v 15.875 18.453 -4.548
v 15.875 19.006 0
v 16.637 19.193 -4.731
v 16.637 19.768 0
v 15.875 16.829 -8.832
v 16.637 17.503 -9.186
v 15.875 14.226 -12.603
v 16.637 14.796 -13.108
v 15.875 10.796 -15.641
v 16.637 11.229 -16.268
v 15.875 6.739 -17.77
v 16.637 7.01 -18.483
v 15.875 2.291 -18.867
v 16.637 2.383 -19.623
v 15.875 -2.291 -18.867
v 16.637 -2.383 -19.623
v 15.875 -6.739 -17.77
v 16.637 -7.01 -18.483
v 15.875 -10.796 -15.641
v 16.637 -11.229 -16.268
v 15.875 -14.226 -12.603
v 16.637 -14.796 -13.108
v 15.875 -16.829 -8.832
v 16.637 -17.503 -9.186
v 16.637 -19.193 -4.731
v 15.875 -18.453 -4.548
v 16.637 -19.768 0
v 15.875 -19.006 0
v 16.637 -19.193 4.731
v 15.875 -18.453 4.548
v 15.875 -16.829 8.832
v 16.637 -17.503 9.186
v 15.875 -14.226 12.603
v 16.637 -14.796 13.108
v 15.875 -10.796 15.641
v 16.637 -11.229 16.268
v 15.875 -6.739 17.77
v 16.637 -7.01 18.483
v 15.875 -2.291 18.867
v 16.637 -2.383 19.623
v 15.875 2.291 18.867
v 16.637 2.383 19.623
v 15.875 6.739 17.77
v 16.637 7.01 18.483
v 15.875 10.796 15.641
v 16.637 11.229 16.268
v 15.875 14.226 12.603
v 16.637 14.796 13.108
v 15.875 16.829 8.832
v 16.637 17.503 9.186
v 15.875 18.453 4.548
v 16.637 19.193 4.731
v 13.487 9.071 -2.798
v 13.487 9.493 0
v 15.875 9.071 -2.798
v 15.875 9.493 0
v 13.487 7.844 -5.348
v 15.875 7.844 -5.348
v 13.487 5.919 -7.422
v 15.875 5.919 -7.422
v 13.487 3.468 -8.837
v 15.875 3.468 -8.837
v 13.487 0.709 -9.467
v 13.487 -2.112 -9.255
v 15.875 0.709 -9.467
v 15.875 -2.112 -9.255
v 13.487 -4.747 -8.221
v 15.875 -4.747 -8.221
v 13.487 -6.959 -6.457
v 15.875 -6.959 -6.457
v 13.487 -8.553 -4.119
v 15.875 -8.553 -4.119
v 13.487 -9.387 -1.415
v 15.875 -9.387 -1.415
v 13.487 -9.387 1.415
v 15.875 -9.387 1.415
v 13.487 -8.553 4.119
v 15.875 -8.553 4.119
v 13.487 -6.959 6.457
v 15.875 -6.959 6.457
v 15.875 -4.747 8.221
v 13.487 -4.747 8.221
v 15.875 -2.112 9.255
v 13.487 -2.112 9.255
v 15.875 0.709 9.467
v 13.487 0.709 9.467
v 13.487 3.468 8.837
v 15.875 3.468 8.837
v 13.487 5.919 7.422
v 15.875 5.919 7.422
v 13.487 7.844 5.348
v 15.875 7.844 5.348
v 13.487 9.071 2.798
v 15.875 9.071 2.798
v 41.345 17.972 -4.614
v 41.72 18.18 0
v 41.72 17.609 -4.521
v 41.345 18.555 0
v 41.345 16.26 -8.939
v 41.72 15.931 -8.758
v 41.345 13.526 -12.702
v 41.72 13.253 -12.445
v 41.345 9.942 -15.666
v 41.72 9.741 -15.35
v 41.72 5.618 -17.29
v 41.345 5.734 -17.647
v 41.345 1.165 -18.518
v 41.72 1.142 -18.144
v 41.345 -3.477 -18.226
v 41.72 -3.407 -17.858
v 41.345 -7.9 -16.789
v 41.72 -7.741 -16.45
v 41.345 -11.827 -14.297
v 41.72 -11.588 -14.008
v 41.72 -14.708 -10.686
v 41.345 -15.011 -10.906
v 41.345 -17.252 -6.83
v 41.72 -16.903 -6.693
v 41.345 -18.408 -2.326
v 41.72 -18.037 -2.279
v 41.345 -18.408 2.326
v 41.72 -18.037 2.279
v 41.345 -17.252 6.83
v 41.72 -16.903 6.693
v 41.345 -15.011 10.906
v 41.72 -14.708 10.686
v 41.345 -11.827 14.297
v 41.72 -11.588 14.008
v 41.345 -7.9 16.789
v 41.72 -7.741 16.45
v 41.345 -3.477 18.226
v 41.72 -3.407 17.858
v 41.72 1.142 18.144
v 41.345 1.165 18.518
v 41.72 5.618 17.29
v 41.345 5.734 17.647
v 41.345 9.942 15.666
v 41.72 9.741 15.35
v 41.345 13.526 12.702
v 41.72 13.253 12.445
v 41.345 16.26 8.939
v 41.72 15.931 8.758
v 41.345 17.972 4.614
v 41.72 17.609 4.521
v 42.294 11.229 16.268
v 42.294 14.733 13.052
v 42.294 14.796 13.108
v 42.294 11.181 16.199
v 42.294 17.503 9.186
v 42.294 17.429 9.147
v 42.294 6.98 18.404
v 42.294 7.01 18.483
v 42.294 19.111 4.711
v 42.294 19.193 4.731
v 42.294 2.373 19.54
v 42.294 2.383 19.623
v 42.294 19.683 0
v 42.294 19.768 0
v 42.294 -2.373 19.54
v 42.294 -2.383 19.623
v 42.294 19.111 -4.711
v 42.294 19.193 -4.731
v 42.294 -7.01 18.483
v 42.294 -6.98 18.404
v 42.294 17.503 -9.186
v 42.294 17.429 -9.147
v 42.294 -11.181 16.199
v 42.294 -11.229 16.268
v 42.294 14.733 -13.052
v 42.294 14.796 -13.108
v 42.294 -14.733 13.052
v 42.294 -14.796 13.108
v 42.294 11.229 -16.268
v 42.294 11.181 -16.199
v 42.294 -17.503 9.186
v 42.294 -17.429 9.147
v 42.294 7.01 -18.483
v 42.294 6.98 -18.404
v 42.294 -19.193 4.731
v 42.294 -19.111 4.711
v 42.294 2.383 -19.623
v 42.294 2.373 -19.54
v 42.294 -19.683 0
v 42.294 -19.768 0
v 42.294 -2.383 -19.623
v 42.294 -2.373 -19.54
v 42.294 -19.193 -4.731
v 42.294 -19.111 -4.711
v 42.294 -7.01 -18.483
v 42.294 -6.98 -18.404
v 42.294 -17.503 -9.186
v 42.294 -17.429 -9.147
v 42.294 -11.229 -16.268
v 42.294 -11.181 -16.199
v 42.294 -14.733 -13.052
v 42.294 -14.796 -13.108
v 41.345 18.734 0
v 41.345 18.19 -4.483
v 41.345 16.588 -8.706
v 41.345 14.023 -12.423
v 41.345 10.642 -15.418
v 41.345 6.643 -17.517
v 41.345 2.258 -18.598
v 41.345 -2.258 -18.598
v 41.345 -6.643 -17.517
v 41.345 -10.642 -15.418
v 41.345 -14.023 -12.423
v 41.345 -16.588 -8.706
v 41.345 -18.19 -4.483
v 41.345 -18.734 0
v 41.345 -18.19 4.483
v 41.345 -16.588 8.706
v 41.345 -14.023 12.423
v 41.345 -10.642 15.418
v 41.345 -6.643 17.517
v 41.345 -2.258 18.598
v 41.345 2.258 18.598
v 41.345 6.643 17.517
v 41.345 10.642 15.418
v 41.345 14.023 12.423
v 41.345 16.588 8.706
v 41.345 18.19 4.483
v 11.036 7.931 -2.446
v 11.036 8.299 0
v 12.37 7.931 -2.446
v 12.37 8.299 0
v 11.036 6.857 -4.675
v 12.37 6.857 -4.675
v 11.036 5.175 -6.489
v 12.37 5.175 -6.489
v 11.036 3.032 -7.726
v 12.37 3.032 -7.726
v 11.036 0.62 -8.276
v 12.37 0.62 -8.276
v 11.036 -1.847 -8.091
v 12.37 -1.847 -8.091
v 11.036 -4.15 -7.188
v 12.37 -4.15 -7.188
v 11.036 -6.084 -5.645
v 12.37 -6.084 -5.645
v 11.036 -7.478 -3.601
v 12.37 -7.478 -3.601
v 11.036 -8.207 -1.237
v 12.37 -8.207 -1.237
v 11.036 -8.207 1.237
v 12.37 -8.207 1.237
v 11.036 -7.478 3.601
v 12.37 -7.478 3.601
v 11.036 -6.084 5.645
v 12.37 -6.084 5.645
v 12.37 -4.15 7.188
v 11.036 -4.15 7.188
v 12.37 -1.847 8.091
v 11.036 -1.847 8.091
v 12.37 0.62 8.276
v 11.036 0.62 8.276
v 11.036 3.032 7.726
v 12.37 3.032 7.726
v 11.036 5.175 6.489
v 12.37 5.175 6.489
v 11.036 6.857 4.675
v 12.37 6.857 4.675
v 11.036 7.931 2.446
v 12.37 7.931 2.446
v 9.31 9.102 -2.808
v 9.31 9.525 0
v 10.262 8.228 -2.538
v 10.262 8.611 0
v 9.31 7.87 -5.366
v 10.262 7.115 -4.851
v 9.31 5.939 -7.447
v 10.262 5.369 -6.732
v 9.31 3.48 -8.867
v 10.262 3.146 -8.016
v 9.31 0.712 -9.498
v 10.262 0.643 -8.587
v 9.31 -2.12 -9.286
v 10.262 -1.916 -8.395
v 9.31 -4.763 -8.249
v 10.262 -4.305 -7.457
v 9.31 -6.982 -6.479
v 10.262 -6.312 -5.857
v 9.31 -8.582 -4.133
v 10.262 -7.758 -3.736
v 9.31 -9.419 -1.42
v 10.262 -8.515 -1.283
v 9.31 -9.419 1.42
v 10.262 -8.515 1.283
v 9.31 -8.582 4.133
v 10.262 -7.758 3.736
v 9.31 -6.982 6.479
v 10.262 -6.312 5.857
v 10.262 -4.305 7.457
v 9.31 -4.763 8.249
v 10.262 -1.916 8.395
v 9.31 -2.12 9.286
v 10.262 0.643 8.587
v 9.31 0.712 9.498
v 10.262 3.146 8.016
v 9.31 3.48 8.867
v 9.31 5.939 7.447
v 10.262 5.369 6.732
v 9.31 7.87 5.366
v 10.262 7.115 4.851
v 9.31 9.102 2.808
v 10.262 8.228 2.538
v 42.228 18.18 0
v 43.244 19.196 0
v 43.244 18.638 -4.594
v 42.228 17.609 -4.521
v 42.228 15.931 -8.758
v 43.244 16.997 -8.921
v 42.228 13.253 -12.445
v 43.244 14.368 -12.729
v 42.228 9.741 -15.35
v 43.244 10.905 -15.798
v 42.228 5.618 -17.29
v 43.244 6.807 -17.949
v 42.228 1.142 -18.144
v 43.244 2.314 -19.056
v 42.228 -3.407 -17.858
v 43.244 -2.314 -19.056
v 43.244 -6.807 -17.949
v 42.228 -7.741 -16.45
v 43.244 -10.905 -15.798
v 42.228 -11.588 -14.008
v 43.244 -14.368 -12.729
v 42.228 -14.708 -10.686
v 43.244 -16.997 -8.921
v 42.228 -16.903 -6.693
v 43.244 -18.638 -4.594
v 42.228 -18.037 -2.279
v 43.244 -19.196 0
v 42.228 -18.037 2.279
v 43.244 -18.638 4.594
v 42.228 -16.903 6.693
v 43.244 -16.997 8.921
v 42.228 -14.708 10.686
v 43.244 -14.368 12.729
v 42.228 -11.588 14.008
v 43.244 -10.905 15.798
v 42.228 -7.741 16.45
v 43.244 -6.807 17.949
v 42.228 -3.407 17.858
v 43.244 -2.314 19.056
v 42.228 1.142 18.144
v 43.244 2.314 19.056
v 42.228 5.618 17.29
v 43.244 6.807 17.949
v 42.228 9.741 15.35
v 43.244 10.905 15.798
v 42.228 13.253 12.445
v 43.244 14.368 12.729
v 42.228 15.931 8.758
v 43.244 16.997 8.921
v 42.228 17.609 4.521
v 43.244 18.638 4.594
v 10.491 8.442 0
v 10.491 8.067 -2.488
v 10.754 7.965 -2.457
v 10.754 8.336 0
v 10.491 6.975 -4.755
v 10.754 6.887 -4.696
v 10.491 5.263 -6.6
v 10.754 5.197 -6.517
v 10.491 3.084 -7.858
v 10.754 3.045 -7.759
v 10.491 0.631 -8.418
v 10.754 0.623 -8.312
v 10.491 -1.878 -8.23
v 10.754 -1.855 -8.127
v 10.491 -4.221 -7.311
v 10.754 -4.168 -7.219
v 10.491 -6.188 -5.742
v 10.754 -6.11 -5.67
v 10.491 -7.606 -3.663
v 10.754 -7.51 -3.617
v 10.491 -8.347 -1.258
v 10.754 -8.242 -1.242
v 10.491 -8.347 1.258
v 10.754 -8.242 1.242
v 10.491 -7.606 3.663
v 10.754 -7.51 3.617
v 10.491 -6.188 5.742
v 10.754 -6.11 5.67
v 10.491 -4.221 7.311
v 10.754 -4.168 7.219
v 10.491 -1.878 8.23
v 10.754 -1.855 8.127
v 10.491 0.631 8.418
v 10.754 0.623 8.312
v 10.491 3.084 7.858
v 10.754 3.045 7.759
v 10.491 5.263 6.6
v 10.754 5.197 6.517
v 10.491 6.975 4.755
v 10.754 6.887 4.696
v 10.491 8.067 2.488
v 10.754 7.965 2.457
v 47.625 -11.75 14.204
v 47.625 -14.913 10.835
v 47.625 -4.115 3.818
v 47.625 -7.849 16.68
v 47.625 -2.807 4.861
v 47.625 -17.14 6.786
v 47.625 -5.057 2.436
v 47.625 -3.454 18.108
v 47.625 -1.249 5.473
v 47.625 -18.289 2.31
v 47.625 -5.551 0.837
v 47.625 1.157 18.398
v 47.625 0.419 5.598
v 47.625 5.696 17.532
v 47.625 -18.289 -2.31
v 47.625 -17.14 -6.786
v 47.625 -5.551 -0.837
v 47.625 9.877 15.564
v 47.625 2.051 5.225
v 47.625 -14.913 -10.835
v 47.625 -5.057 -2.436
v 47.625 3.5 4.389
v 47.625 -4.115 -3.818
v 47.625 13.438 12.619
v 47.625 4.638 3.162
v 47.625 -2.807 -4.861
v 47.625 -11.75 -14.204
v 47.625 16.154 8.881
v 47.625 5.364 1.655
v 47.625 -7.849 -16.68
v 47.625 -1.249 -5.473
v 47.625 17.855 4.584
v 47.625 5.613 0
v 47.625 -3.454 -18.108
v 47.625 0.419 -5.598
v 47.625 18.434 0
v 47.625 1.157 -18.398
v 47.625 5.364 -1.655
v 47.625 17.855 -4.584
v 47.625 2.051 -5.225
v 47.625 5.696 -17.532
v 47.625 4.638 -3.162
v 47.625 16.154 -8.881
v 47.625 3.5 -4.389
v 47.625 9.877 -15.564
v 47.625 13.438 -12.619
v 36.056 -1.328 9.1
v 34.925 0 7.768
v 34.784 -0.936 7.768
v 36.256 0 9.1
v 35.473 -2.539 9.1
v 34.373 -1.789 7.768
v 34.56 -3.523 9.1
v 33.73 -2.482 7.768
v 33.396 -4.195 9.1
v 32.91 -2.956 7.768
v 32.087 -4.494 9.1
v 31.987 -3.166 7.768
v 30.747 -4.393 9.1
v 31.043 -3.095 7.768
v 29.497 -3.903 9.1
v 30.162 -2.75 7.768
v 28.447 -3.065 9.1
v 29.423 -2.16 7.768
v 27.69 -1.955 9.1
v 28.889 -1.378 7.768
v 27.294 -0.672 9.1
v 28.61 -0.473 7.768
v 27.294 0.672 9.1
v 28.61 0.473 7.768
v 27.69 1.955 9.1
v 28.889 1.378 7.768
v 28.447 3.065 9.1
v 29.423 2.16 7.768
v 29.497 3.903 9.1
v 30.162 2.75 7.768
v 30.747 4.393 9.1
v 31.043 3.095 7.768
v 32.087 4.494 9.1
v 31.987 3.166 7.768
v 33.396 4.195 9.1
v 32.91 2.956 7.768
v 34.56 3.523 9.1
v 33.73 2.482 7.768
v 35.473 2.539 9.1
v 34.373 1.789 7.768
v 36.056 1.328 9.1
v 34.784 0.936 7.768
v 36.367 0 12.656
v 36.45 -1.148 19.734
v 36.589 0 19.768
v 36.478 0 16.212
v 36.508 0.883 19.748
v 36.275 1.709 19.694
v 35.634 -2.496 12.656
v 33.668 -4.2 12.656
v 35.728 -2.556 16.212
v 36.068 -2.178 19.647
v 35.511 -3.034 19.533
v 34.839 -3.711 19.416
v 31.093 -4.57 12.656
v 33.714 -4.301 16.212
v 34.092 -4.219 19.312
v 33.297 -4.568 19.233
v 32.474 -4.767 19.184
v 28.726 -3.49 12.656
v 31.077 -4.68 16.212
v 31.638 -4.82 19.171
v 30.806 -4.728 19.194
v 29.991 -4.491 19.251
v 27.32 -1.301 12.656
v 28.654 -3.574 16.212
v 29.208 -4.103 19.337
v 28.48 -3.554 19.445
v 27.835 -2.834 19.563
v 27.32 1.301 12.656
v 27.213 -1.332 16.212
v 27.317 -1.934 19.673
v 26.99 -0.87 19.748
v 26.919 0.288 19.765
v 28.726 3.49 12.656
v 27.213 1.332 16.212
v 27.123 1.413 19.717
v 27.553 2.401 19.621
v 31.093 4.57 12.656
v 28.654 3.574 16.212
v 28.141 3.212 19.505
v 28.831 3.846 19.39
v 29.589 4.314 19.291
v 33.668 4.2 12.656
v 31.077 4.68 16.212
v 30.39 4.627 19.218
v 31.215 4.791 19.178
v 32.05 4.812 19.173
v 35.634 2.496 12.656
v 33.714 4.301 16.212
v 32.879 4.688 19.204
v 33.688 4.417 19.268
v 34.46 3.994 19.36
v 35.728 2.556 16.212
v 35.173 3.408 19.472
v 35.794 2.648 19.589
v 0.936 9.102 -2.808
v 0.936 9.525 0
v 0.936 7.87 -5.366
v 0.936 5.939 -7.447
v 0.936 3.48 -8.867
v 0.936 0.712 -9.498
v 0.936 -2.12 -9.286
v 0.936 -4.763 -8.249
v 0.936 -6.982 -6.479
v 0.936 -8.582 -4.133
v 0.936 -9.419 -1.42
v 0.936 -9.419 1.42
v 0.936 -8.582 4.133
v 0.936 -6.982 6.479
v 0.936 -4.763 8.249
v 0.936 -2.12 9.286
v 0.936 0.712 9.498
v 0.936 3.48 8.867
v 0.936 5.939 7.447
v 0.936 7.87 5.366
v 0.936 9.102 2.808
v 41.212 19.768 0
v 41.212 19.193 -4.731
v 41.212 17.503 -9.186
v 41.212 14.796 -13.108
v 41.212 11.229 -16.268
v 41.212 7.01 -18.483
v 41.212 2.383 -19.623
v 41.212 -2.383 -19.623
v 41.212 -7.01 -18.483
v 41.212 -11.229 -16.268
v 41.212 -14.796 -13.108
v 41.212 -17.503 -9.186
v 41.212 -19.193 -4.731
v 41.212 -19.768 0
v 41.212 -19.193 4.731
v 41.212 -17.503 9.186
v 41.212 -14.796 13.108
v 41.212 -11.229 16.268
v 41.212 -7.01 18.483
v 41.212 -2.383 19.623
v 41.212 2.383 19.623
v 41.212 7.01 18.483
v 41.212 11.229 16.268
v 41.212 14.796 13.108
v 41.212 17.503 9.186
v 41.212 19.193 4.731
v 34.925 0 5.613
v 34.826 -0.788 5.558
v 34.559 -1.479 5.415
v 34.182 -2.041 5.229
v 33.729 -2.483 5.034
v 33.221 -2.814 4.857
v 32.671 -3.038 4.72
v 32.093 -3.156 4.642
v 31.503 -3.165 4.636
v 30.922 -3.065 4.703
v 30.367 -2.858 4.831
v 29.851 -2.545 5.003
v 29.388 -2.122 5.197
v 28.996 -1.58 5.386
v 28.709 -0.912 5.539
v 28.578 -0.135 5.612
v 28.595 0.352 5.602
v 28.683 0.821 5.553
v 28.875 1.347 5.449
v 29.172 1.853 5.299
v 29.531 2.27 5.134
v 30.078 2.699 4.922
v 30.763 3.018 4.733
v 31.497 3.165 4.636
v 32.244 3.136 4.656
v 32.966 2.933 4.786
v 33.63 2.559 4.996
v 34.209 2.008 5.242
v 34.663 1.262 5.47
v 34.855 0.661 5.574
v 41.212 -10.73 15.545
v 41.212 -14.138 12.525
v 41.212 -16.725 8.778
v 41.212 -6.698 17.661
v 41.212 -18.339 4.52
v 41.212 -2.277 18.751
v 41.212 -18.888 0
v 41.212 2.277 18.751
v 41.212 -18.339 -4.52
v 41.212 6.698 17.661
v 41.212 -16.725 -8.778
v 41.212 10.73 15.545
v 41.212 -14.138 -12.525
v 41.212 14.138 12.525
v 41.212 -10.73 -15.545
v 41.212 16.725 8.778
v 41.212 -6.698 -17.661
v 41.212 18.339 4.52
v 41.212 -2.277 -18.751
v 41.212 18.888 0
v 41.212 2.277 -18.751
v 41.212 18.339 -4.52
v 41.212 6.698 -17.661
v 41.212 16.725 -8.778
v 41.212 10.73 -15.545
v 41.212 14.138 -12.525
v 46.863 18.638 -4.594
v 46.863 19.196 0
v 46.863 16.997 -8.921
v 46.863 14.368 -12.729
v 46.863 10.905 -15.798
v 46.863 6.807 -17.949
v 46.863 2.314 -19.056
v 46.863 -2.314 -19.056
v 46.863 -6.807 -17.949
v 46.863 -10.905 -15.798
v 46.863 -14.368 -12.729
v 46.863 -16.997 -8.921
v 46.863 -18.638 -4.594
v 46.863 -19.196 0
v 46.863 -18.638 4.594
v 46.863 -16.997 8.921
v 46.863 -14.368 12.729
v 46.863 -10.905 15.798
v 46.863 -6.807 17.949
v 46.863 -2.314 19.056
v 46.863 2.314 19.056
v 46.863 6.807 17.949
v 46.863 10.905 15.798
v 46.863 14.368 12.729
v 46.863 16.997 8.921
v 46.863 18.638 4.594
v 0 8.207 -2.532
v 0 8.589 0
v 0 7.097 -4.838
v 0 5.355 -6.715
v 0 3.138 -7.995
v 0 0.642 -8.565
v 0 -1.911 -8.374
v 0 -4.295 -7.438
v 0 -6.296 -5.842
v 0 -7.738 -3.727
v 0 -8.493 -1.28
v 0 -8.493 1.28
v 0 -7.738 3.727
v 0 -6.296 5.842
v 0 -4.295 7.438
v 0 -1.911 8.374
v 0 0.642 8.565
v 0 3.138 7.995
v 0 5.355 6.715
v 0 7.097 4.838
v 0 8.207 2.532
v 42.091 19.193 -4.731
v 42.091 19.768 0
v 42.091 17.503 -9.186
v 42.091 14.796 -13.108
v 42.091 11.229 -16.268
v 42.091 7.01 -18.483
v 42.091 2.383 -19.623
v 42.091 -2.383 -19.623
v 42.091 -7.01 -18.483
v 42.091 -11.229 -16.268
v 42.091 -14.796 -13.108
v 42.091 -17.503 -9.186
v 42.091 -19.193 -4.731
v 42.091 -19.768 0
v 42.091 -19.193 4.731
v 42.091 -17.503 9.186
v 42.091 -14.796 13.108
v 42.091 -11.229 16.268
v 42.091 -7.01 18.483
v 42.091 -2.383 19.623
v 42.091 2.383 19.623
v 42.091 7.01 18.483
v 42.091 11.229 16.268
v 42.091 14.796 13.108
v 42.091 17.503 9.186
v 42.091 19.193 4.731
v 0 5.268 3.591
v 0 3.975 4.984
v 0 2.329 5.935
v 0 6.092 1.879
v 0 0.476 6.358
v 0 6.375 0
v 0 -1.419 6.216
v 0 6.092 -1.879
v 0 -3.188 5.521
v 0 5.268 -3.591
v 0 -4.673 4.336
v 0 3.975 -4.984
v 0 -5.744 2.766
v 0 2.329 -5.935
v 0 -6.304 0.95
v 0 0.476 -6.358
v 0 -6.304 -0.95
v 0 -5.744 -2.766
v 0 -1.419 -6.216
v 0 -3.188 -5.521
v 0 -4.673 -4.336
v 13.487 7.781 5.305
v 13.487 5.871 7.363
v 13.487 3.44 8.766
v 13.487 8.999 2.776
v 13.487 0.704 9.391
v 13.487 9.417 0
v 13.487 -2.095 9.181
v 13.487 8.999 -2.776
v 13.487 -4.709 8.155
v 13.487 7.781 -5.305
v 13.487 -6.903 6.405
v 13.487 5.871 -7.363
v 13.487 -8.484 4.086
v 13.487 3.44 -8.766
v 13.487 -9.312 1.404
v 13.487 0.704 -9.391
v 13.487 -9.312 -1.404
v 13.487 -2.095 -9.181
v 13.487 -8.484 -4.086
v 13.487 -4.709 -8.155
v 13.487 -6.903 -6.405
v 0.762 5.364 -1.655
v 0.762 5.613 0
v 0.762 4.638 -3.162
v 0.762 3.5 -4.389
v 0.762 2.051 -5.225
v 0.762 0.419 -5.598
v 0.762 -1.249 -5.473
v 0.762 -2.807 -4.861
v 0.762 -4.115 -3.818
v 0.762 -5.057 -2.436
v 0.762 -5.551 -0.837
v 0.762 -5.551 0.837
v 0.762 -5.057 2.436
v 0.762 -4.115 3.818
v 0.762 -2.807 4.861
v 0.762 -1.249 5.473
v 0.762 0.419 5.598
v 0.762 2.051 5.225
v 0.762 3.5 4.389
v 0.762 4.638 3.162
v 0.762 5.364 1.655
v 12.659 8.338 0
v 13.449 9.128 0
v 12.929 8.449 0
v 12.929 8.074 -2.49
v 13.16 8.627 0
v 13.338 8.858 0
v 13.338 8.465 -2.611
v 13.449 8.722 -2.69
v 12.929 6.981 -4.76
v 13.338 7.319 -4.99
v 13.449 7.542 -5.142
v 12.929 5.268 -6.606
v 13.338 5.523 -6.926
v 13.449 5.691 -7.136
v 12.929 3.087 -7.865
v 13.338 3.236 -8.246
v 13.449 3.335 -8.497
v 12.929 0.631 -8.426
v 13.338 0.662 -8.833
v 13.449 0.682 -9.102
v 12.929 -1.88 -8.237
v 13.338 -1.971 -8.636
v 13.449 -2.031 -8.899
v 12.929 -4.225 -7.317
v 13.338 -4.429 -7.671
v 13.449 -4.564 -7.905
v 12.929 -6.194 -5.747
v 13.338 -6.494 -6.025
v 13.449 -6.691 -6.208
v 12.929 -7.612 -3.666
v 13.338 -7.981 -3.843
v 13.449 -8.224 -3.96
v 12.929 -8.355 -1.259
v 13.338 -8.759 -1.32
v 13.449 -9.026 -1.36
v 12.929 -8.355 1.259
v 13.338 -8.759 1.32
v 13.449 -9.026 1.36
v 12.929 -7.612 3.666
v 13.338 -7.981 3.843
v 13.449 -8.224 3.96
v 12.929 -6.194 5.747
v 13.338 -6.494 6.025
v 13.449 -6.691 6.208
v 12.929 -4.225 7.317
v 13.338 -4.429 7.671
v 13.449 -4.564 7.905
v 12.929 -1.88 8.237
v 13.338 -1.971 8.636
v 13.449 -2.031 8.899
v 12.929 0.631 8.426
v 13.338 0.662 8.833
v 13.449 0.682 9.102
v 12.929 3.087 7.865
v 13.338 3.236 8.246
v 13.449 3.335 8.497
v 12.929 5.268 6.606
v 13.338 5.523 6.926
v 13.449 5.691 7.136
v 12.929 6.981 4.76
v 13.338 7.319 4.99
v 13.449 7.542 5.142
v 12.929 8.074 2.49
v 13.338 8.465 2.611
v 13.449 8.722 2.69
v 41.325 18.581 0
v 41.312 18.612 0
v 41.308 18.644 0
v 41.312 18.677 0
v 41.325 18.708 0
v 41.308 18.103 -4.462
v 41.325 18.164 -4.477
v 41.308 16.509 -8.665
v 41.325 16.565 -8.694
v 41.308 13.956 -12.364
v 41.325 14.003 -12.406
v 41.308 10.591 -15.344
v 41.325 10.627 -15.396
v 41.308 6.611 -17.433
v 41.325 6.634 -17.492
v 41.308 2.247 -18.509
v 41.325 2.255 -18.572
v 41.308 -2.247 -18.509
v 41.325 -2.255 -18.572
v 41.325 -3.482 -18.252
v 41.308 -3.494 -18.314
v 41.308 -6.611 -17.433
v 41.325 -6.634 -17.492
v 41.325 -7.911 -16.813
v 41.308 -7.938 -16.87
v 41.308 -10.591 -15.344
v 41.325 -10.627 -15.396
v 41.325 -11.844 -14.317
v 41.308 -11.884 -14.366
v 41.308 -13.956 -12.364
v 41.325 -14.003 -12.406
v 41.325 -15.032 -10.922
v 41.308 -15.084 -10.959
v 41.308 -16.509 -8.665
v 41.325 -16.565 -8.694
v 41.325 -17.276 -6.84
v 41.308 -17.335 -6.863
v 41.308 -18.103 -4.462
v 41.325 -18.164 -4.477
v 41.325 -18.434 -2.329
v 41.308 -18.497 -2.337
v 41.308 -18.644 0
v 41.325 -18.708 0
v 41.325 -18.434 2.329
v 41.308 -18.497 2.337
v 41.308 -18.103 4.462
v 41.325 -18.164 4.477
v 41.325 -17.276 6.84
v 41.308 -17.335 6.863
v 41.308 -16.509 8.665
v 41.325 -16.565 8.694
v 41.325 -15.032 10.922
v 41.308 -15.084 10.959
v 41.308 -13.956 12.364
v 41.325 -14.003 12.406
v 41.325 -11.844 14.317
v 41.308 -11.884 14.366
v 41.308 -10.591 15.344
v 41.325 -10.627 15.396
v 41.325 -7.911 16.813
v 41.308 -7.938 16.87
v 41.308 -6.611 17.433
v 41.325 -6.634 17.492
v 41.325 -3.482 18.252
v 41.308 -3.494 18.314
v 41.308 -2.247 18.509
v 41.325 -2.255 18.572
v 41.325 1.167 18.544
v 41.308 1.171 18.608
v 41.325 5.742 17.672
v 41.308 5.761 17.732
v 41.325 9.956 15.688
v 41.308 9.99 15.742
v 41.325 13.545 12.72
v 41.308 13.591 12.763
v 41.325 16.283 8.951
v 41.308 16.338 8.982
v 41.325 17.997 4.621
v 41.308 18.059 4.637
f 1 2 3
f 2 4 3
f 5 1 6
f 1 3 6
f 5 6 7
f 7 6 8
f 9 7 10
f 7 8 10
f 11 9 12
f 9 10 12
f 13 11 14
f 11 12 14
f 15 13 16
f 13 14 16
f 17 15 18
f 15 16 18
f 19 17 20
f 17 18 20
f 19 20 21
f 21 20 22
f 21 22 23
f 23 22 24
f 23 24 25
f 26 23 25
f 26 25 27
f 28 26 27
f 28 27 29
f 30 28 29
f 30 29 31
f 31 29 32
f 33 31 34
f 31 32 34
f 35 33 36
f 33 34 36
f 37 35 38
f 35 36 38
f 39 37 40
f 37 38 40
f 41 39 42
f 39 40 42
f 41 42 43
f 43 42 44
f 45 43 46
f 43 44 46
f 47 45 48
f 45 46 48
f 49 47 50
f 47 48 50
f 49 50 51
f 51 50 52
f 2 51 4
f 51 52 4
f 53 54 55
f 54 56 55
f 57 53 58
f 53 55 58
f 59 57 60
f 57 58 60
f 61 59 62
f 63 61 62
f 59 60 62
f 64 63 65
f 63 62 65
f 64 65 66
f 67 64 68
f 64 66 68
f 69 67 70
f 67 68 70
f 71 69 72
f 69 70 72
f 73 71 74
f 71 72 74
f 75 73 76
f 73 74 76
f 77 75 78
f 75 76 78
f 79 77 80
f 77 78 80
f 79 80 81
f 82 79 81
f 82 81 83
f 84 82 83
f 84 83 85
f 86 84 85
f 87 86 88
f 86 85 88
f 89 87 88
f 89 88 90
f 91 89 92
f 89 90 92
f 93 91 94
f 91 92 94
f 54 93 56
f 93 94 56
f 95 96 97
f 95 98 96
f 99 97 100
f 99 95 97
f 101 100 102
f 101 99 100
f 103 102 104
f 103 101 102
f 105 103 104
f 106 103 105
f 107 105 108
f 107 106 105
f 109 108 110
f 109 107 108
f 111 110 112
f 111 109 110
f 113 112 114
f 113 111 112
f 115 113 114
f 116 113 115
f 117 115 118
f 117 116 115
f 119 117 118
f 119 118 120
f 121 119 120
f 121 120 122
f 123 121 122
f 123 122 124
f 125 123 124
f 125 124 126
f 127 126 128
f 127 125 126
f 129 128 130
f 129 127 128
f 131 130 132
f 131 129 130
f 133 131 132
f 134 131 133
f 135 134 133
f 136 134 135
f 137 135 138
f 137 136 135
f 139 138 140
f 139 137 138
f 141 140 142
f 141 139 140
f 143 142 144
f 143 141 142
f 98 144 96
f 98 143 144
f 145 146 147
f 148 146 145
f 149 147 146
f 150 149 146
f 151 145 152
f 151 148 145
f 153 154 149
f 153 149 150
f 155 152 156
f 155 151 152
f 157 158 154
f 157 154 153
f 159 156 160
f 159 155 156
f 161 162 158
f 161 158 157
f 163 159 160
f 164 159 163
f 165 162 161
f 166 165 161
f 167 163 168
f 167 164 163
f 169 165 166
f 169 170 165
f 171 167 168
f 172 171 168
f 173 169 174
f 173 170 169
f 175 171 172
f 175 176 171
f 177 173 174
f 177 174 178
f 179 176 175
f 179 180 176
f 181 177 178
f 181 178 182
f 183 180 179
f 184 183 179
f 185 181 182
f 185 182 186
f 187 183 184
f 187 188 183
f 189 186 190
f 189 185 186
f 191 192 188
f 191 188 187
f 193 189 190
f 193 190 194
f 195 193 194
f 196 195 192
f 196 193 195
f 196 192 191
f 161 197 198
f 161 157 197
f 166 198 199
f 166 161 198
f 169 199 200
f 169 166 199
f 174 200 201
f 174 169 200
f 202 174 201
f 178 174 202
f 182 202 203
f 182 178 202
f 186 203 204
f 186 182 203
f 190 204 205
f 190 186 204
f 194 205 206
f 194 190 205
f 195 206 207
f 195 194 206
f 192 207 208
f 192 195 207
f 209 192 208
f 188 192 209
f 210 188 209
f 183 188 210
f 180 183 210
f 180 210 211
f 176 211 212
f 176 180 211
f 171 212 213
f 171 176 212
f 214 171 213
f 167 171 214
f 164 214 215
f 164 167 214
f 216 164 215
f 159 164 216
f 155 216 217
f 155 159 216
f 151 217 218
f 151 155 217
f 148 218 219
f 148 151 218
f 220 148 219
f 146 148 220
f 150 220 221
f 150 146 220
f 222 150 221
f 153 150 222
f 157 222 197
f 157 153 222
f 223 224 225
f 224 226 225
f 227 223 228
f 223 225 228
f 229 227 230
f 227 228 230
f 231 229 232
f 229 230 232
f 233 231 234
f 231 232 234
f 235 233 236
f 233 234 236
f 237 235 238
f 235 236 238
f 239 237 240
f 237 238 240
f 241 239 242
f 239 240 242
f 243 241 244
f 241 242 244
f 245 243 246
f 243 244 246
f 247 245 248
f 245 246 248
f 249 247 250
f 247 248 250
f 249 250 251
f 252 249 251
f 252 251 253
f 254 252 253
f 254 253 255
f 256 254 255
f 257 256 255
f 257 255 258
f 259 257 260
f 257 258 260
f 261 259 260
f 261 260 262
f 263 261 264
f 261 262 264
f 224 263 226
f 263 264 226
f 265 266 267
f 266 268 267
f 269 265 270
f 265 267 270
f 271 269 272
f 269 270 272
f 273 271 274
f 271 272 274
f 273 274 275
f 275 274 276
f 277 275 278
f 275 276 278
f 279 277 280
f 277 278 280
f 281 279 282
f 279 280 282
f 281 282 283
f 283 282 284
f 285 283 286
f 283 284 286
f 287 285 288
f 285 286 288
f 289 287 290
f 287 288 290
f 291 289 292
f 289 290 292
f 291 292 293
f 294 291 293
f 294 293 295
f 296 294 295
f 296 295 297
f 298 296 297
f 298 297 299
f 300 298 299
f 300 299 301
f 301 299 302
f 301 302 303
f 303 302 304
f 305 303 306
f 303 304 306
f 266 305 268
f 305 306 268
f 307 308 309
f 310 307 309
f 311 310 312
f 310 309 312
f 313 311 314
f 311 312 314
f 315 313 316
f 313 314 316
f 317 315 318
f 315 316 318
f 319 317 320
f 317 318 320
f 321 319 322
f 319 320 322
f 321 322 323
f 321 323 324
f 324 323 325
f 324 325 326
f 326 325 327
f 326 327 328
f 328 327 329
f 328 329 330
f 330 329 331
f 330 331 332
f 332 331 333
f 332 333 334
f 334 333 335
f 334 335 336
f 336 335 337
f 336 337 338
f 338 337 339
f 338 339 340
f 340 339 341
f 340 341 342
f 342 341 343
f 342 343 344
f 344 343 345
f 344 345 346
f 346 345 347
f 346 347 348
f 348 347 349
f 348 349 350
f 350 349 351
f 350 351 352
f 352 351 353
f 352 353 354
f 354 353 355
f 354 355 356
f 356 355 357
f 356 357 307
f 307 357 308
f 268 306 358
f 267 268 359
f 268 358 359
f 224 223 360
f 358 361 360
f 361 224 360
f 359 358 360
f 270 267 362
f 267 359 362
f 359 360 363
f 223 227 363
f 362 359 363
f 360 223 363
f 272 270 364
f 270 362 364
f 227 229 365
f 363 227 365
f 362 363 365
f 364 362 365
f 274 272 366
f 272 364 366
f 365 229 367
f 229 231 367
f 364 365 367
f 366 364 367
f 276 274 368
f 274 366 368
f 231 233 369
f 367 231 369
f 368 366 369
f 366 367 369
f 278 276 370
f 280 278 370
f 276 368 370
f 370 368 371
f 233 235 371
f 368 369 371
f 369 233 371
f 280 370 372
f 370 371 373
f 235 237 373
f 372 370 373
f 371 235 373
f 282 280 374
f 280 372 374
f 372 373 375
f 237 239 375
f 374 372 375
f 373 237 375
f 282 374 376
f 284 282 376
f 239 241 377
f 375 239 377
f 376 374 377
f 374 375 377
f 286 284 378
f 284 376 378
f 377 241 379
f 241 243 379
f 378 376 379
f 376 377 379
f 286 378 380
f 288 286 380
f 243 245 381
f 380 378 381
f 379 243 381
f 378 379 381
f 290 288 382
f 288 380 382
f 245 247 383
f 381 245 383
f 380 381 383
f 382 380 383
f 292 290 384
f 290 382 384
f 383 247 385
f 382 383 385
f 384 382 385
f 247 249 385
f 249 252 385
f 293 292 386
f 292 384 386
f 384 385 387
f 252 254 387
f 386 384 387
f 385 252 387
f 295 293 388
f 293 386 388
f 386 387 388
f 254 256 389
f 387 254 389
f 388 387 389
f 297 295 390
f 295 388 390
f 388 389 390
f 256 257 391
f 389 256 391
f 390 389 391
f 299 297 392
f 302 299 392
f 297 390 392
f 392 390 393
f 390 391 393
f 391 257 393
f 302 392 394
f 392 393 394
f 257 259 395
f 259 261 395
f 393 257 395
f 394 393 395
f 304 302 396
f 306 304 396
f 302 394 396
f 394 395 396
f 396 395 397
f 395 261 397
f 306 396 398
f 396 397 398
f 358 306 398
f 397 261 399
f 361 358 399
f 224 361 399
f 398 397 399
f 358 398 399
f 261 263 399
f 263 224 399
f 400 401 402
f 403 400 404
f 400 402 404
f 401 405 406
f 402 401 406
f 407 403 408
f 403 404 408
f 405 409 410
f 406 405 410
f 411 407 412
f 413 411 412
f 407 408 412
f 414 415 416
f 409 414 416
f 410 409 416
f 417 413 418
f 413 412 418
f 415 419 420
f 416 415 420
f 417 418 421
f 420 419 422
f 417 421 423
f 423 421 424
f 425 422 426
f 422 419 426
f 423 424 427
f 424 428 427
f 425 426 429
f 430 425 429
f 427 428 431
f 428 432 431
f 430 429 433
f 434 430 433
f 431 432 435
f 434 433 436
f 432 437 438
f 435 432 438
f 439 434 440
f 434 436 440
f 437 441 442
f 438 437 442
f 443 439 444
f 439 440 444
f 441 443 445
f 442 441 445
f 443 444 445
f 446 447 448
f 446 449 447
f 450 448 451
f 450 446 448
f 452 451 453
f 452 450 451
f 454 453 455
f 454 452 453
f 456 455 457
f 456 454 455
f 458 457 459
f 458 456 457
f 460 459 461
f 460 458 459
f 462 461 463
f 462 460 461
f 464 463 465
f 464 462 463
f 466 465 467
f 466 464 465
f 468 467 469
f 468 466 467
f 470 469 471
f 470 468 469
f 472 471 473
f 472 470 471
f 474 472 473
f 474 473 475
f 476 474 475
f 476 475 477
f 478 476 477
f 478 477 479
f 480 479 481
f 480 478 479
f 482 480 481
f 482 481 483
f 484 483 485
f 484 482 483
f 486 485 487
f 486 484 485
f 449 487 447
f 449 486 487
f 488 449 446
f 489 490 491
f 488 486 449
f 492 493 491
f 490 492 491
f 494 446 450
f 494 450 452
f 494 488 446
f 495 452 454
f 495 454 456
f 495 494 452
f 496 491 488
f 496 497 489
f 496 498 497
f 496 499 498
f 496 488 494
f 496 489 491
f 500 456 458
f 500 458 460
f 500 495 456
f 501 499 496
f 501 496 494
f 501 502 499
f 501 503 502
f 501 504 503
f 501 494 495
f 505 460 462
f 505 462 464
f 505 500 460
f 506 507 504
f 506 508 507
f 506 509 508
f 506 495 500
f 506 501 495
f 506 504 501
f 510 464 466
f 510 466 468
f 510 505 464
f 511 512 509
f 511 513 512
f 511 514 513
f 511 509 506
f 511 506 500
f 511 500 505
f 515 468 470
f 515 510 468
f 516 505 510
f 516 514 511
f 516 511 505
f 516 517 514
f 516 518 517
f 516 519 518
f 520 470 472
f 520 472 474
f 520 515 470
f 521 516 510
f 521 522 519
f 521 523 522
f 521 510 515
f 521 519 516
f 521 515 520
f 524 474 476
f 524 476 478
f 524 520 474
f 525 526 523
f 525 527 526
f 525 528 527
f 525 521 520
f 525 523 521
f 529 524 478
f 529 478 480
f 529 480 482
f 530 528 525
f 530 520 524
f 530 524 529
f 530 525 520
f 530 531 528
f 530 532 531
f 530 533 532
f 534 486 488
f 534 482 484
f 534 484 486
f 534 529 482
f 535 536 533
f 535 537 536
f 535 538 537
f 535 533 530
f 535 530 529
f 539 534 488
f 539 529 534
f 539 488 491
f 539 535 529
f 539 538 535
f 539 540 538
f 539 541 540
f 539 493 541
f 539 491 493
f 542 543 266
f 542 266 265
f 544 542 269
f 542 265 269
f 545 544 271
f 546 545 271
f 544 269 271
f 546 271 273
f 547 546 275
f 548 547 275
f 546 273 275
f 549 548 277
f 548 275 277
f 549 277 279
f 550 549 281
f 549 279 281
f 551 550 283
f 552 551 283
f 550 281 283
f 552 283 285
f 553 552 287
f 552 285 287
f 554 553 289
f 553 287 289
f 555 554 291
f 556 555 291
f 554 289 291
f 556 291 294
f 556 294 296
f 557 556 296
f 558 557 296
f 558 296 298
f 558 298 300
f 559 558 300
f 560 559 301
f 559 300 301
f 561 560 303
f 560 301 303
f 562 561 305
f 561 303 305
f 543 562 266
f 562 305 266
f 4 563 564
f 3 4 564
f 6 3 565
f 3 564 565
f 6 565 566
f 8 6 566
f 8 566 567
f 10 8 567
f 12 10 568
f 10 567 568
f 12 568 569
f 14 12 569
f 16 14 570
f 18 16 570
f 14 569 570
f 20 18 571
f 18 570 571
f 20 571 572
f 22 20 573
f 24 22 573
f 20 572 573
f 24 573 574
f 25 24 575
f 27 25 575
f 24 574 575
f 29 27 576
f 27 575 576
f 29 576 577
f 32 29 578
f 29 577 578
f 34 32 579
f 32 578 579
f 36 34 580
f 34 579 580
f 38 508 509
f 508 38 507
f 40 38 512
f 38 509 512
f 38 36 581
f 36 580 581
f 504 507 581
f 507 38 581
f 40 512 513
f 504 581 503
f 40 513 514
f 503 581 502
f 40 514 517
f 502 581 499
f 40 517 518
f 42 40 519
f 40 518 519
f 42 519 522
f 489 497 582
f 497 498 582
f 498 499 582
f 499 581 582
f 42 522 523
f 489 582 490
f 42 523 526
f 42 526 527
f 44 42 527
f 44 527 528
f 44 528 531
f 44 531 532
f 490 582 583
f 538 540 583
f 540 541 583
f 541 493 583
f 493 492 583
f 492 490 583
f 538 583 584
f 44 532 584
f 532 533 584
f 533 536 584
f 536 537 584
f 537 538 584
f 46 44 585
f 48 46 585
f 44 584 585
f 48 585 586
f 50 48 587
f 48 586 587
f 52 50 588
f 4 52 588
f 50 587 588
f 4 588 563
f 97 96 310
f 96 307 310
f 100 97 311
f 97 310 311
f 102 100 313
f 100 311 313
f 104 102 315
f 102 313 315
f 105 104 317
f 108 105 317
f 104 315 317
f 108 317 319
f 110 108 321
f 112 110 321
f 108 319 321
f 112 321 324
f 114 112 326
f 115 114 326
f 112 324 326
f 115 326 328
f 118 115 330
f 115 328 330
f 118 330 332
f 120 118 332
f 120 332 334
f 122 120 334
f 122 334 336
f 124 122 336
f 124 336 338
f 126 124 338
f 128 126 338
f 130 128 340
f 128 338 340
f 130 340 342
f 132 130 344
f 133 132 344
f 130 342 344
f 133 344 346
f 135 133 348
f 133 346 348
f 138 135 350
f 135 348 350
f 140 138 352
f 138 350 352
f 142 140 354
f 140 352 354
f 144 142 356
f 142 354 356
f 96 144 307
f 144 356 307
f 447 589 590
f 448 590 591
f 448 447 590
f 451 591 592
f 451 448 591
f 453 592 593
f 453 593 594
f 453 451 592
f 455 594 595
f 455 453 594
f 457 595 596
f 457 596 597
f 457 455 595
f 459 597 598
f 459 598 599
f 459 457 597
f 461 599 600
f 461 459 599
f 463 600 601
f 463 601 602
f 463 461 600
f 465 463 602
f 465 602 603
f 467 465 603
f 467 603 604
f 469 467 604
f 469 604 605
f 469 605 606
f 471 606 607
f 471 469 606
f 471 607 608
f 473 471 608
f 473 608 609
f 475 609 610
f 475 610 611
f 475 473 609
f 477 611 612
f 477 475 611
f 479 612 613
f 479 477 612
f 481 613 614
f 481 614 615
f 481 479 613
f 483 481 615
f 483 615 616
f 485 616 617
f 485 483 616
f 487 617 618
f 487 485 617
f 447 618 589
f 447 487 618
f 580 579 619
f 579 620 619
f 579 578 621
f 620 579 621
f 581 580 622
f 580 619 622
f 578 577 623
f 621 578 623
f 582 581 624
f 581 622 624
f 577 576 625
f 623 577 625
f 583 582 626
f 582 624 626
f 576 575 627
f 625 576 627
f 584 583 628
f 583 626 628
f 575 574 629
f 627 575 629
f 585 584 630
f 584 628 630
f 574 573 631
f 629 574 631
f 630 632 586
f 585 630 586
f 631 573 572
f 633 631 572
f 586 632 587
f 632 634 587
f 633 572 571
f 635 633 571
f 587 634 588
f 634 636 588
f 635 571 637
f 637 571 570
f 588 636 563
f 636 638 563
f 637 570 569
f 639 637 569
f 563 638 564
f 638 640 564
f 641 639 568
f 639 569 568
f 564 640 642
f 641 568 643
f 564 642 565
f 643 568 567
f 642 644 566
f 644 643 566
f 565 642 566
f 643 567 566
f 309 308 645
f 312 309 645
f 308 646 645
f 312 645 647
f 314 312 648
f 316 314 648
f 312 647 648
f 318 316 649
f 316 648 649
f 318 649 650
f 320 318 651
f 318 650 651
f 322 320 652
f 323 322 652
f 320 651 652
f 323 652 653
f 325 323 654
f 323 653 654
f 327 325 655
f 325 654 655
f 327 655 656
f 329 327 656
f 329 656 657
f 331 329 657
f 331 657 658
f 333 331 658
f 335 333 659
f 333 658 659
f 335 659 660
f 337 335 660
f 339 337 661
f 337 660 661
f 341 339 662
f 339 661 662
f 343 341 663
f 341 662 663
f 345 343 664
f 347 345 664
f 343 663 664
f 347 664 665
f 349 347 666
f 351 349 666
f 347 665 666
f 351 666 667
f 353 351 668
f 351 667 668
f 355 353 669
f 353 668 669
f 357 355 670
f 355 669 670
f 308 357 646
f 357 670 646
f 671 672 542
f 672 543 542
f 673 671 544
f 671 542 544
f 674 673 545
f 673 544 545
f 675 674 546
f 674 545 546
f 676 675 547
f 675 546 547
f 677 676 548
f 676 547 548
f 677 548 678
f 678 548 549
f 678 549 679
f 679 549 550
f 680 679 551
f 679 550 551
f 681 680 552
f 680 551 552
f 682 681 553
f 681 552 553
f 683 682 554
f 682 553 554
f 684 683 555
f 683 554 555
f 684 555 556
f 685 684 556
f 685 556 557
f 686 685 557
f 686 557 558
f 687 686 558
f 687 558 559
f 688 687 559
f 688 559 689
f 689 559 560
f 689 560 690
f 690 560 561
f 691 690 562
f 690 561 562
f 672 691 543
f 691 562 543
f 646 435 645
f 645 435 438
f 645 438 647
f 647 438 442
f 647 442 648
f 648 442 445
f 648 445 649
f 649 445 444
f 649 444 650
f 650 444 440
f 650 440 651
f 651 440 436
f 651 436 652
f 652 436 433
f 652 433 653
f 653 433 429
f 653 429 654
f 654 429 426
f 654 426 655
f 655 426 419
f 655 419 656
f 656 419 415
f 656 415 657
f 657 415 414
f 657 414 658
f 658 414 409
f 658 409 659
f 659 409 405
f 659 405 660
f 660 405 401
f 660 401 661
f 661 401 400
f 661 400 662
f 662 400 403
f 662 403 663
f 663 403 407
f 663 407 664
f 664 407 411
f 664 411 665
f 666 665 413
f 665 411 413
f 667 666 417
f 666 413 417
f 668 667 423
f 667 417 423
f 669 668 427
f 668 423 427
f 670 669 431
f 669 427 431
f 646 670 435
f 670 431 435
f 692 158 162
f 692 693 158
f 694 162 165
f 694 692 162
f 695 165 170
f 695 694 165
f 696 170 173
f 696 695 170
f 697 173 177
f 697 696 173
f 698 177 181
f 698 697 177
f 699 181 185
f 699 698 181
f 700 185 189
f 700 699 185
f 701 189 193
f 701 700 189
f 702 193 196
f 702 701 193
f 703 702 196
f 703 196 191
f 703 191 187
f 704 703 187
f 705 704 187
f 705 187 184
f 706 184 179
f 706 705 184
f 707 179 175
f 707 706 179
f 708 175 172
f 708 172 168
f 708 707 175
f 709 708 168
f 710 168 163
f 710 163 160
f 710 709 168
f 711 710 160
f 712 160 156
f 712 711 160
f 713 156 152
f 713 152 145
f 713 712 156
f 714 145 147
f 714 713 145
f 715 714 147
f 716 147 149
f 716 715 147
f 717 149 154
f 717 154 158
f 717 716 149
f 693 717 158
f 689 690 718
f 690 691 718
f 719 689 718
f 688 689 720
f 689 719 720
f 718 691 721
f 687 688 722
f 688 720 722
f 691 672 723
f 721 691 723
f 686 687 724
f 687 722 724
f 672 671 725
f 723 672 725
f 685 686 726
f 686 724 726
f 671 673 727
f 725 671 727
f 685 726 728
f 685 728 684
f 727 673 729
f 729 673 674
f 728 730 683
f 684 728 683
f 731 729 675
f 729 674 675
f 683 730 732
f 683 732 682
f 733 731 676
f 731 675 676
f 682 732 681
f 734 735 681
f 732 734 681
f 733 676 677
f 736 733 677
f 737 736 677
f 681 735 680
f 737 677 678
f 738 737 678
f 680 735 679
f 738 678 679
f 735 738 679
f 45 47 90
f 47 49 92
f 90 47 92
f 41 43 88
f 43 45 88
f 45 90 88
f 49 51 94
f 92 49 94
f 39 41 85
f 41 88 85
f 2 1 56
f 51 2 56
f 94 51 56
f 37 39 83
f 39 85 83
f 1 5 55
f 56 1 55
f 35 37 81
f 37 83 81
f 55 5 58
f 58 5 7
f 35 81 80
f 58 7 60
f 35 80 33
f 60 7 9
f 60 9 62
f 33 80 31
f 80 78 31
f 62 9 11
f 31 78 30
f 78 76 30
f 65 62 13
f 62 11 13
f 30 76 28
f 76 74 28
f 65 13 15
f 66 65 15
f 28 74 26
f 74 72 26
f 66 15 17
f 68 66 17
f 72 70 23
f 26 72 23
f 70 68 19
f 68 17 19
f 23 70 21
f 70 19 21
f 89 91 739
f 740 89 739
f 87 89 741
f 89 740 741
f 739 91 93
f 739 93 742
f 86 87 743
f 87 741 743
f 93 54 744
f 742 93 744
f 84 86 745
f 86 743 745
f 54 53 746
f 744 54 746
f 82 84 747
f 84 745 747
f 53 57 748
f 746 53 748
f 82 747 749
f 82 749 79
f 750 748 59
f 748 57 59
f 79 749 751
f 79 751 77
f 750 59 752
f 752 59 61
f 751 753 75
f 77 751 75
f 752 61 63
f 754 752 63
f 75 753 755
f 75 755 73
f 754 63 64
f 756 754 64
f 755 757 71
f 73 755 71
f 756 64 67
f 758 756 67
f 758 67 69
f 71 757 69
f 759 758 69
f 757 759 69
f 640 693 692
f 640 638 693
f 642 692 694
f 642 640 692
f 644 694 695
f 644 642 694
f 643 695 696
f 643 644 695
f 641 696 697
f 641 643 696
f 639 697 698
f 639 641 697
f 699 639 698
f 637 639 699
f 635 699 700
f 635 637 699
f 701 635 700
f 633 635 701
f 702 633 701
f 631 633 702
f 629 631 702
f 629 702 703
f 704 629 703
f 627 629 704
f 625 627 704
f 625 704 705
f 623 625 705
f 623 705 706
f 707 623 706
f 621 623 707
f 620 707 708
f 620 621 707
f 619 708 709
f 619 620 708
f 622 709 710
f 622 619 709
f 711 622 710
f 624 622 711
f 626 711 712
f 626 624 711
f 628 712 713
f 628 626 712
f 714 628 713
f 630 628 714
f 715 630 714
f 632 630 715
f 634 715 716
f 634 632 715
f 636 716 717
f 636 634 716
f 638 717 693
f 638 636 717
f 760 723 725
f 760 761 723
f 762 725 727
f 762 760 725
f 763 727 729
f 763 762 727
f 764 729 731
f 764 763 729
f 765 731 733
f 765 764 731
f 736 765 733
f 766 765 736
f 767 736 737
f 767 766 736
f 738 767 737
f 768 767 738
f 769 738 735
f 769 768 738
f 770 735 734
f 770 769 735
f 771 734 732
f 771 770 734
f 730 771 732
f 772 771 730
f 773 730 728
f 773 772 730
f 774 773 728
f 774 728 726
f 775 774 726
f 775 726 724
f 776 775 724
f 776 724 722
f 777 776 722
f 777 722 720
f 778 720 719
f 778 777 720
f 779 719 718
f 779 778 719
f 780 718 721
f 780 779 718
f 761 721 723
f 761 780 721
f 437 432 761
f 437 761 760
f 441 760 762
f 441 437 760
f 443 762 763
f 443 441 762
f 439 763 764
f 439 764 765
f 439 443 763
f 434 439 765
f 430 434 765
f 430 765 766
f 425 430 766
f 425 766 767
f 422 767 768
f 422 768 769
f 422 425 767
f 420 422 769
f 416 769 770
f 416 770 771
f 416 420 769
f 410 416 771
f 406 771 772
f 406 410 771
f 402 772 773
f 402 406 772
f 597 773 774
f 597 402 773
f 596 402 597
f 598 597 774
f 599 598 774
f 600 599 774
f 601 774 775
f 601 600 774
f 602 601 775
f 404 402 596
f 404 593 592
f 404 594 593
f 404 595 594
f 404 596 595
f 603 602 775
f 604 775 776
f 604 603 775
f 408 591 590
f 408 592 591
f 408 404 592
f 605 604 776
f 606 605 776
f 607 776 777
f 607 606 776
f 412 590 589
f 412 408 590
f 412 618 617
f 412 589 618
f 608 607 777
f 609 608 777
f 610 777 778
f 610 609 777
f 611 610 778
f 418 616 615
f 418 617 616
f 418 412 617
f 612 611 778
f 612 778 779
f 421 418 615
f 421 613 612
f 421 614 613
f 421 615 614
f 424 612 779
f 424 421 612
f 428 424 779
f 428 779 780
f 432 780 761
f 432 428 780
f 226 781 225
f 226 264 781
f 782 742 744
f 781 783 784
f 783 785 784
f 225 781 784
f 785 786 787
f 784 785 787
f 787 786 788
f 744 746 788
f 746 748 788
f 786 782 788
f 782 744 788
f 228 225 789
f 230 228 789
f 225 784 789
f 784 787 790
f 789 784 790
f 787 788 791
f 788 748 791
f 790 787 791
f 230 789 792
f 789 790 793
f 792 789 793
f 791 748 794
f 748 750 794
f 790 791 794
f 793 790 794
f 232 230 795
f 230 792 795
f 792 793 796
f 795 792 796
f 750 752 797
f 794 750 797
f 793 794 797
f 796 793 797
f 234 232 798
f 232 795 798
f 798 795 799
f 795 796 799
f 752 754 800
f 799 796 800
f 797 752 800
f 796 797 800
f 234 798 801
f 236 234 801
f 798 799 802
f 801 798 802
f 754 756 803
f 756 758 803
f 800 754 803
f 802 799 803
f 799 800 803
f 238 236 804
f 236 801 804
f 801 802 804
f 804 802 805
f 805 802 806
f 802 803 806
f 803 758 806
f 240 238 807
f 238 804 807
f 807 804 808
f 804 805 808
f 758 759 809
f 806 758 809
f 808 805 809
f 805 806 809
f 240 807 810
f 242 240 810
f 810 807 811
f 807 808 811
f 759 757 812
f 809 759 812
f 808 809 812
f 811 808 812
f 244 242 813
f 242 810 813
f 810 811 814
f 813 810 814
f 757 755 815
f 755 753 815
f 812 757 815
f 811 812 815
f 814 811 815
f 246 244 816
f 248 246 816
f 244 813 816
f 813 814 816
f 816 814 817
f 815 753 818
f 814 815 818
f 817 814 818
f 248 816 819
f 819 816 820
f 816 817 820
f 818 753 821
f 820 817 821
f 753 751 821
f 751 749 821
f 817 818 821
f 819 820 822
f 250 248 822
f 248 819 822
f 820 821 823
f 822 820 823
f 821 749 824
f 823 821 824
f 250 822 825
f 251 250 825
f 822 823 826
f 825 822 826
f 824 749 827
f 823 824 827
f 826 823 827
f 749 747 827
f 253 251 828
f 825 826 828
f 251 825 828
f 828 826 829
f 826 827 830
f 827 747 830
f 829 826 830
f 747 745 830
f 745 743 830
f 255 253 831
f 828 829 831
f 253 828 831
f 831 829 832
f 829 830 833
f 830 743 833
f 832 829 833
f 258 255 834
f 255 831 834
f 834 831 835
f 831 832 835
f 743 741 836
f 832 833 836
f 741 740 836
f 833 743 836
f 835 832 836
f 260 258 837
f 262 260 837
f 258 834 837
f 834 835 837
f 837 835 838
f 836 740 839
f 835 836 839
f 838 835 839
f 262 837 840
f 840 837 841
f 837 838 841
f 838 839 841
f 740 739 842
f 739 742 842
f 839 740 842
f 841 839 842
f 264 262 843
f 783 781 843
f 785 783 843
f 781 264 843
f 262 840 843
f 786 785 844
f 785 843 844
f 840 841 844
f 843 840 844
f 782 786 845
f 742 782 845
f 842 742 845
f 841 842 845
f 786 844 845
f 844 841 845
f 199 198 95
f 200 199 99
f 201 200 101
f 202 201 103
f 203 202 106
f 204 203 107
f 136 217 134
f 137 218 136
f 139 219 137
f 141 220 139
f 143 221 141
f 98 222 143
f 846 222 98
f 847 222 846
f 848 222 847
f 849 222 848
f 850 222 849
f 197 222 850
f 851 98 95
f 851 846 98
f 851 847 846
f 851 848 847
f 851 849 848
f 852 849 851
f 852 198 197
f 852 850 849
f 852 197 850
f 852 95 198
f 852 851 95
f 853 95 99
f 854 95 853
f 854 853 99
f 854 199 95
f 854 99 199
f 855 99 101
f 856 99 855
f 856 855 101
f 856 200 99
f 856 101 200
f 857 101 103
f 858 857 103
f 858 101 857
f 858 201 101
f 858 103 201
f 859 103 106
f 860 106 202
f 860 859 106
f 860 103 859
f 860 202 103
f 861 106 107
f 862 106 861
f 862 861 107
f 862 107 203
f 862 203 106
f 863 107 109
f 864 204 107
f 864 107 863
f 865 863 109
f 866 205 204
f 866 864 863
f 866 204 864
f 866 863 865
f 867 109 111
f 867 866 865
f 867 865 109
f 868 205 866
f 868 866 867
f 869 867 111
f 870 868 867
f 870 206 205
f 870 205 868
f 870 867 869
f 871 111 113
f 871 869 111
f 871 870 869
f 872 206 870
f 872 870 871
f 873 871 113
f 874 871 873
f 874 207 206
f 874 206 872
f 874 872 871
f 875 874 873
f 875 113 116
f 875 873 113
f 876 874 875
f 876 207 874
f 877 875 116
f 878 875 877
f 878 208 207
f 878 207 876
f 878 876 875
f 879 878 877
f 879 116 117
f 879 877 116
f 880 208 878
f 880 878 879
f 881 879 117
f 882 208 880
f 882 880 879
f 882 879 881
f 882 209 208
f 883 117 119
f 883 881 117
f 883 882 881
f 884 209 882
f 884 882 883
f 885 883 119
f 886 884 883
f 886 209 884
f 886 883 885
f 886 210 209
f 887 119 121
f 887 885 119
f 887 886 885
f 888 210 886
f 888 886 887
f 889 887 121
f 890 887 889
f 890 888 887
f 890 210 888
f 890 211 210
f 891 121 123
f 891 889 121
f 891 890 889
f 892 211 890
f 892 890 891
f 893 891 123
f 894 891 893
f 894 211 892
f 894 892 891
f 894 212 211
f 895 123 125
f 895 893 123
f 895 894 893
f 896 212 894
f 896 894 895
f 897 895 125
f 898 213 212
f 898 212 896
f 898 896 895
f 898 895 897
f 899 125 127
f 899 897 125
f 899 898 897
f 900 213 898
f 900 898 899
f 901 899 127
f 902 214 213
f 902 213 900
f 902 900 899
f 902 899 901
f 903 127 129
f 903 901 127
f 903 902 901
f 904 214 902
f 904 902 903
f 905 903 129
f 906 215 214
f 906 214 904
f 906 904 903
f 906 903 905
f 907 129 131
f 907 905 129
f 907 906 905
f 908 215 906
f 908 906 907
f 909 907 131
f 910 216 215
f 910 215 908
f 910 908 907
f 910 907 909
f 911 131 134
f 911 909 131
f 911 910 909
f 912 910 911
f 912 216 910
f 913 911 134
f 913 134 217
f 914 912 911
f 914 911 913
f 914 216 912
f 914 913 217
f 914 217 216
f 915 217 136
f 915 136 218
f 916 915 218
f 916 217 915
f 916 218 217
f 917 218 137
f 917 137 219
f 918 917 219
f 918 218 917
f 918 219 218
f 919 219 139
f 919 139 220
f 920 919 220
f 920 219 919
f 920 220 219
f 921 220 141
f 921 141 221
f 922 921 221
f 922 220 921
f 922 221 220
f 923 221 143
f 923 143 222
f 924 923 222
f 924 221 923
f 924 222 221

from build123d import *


with BuildPart() as part:
    # Sketch1 → Revolve1 (revolve)
    with BuildSketch(Plane.XY):
        with BuildLine():
            Line((0, 0), (0, 8.58901))
            Line((0, 8.58901), (0.93599, 9.525))
            Line((0.93599, 9.525), (9.310047461, 9.525))
            Line((9.310047461, 9.525), (10.262333187, 8.610821042))
            ThreePointArc((10.262333187, 8.610821042), (10.619173954, 8.380210754), (11.0363, 8.29945))
            Line((11.0363, 8.29945), (12.3698, 8.29945))
            ThreePointArc((12.3698, 8.29945), (13.160062539, 8.626787461), (13.4874, 9.41705))
            Line((13.4874, 9.41705), (13.4874, 9.49325))
            Line((13.4874, 9.49325), (15.875, 9.49325))
            Line((15.875, 9.49325), (15.875, 0))
            Line((15.875, 0), (0, 0))
        make_face()
    revolve(axis=Axis((15.875, 0, 0), (-1, 0, 0)))

    # Sketch2 → Revolve2 (revolve)
    with BuildSketch(Plane.XY):
        Polygon((15.875, 0), (15.875, 19.00555), (16.637, 19.76755), (41.2115, 19.76755), (41.2115, 18.18005), (42.2275, 18.18005), (43.2435, 19.19605), (46.863, 19.19605), (47.625, 18.43405), (47.625, 0), align=None)
    revolve(axis=Axis((47.625, 0, 0), (-1, 0, 0)))

    # Sketch3 → Cut-Revolve1 (revolve, cut)
    with BuildSketch(Plane.XY):
        Polygon((0, 0), (0, 6.3754), (0.762, 5.6134), (47.625, 5.6134), (47.625, 0), align=None)
    revolve(axis=Axis((47.625, 0, 0), (-1, 0, 0)), mode=Mode.SUBTRACT)

    # Sketch4 → Cut-Revolve2 (revolve, cut)
    with BuildSketch(Plane(origin=(0, 0, 0), x_dir=(1, 0, 0), z_dir=(0, 1, 0))):
        Polygon((31.75, 0), (34.925, 0), (34.925, -7.768124148), (36.256425852, -9.09955), (36.589475925, -19.76755), (31.75, -19.76755), align=None)
    revolve(axis=Axis((31.75, 0, 19.76755), (0, 0, -1)), mode=Mode.SUBTRACT)

    # Sketch5 → Revolve3 (revolve)
    with BuildSketch(Plane.XY):
        with BuildLine():
            Line((41.2115, 18.888259175), (41.2115, 17.92605))
            Line((41.2115, 17.92605), (42.2275, 17.92605))
            Line((42.2275, 17.92605), (42.2275, 18.18005))
            Line((42.2275, 18.18005), (41.7195, 18.18005))
            Line((41.7195, 18.18005), (41.344882072, 18.554667928))
            ThreePointArc((41.344882072, 18.554667928), (41.307684633, 18.64447049), (41.344882072, 18.734273051))
            Line((41.344882072, 18.734273051), (42.293990825, 19.683381804))
            Line((42.293990825, 19.683381804), (42.293990825, 19.76755))
            Line((42.293990825, 19.76755), (42.090790825, 19.76755))
            Line((42.090790825, 19.76755), (41.2115, 18.888259175))
        make_face()
    revolve(axis=Axis((42.2275, 0, 0), (-1, 0, 0)))


solid = part.part
